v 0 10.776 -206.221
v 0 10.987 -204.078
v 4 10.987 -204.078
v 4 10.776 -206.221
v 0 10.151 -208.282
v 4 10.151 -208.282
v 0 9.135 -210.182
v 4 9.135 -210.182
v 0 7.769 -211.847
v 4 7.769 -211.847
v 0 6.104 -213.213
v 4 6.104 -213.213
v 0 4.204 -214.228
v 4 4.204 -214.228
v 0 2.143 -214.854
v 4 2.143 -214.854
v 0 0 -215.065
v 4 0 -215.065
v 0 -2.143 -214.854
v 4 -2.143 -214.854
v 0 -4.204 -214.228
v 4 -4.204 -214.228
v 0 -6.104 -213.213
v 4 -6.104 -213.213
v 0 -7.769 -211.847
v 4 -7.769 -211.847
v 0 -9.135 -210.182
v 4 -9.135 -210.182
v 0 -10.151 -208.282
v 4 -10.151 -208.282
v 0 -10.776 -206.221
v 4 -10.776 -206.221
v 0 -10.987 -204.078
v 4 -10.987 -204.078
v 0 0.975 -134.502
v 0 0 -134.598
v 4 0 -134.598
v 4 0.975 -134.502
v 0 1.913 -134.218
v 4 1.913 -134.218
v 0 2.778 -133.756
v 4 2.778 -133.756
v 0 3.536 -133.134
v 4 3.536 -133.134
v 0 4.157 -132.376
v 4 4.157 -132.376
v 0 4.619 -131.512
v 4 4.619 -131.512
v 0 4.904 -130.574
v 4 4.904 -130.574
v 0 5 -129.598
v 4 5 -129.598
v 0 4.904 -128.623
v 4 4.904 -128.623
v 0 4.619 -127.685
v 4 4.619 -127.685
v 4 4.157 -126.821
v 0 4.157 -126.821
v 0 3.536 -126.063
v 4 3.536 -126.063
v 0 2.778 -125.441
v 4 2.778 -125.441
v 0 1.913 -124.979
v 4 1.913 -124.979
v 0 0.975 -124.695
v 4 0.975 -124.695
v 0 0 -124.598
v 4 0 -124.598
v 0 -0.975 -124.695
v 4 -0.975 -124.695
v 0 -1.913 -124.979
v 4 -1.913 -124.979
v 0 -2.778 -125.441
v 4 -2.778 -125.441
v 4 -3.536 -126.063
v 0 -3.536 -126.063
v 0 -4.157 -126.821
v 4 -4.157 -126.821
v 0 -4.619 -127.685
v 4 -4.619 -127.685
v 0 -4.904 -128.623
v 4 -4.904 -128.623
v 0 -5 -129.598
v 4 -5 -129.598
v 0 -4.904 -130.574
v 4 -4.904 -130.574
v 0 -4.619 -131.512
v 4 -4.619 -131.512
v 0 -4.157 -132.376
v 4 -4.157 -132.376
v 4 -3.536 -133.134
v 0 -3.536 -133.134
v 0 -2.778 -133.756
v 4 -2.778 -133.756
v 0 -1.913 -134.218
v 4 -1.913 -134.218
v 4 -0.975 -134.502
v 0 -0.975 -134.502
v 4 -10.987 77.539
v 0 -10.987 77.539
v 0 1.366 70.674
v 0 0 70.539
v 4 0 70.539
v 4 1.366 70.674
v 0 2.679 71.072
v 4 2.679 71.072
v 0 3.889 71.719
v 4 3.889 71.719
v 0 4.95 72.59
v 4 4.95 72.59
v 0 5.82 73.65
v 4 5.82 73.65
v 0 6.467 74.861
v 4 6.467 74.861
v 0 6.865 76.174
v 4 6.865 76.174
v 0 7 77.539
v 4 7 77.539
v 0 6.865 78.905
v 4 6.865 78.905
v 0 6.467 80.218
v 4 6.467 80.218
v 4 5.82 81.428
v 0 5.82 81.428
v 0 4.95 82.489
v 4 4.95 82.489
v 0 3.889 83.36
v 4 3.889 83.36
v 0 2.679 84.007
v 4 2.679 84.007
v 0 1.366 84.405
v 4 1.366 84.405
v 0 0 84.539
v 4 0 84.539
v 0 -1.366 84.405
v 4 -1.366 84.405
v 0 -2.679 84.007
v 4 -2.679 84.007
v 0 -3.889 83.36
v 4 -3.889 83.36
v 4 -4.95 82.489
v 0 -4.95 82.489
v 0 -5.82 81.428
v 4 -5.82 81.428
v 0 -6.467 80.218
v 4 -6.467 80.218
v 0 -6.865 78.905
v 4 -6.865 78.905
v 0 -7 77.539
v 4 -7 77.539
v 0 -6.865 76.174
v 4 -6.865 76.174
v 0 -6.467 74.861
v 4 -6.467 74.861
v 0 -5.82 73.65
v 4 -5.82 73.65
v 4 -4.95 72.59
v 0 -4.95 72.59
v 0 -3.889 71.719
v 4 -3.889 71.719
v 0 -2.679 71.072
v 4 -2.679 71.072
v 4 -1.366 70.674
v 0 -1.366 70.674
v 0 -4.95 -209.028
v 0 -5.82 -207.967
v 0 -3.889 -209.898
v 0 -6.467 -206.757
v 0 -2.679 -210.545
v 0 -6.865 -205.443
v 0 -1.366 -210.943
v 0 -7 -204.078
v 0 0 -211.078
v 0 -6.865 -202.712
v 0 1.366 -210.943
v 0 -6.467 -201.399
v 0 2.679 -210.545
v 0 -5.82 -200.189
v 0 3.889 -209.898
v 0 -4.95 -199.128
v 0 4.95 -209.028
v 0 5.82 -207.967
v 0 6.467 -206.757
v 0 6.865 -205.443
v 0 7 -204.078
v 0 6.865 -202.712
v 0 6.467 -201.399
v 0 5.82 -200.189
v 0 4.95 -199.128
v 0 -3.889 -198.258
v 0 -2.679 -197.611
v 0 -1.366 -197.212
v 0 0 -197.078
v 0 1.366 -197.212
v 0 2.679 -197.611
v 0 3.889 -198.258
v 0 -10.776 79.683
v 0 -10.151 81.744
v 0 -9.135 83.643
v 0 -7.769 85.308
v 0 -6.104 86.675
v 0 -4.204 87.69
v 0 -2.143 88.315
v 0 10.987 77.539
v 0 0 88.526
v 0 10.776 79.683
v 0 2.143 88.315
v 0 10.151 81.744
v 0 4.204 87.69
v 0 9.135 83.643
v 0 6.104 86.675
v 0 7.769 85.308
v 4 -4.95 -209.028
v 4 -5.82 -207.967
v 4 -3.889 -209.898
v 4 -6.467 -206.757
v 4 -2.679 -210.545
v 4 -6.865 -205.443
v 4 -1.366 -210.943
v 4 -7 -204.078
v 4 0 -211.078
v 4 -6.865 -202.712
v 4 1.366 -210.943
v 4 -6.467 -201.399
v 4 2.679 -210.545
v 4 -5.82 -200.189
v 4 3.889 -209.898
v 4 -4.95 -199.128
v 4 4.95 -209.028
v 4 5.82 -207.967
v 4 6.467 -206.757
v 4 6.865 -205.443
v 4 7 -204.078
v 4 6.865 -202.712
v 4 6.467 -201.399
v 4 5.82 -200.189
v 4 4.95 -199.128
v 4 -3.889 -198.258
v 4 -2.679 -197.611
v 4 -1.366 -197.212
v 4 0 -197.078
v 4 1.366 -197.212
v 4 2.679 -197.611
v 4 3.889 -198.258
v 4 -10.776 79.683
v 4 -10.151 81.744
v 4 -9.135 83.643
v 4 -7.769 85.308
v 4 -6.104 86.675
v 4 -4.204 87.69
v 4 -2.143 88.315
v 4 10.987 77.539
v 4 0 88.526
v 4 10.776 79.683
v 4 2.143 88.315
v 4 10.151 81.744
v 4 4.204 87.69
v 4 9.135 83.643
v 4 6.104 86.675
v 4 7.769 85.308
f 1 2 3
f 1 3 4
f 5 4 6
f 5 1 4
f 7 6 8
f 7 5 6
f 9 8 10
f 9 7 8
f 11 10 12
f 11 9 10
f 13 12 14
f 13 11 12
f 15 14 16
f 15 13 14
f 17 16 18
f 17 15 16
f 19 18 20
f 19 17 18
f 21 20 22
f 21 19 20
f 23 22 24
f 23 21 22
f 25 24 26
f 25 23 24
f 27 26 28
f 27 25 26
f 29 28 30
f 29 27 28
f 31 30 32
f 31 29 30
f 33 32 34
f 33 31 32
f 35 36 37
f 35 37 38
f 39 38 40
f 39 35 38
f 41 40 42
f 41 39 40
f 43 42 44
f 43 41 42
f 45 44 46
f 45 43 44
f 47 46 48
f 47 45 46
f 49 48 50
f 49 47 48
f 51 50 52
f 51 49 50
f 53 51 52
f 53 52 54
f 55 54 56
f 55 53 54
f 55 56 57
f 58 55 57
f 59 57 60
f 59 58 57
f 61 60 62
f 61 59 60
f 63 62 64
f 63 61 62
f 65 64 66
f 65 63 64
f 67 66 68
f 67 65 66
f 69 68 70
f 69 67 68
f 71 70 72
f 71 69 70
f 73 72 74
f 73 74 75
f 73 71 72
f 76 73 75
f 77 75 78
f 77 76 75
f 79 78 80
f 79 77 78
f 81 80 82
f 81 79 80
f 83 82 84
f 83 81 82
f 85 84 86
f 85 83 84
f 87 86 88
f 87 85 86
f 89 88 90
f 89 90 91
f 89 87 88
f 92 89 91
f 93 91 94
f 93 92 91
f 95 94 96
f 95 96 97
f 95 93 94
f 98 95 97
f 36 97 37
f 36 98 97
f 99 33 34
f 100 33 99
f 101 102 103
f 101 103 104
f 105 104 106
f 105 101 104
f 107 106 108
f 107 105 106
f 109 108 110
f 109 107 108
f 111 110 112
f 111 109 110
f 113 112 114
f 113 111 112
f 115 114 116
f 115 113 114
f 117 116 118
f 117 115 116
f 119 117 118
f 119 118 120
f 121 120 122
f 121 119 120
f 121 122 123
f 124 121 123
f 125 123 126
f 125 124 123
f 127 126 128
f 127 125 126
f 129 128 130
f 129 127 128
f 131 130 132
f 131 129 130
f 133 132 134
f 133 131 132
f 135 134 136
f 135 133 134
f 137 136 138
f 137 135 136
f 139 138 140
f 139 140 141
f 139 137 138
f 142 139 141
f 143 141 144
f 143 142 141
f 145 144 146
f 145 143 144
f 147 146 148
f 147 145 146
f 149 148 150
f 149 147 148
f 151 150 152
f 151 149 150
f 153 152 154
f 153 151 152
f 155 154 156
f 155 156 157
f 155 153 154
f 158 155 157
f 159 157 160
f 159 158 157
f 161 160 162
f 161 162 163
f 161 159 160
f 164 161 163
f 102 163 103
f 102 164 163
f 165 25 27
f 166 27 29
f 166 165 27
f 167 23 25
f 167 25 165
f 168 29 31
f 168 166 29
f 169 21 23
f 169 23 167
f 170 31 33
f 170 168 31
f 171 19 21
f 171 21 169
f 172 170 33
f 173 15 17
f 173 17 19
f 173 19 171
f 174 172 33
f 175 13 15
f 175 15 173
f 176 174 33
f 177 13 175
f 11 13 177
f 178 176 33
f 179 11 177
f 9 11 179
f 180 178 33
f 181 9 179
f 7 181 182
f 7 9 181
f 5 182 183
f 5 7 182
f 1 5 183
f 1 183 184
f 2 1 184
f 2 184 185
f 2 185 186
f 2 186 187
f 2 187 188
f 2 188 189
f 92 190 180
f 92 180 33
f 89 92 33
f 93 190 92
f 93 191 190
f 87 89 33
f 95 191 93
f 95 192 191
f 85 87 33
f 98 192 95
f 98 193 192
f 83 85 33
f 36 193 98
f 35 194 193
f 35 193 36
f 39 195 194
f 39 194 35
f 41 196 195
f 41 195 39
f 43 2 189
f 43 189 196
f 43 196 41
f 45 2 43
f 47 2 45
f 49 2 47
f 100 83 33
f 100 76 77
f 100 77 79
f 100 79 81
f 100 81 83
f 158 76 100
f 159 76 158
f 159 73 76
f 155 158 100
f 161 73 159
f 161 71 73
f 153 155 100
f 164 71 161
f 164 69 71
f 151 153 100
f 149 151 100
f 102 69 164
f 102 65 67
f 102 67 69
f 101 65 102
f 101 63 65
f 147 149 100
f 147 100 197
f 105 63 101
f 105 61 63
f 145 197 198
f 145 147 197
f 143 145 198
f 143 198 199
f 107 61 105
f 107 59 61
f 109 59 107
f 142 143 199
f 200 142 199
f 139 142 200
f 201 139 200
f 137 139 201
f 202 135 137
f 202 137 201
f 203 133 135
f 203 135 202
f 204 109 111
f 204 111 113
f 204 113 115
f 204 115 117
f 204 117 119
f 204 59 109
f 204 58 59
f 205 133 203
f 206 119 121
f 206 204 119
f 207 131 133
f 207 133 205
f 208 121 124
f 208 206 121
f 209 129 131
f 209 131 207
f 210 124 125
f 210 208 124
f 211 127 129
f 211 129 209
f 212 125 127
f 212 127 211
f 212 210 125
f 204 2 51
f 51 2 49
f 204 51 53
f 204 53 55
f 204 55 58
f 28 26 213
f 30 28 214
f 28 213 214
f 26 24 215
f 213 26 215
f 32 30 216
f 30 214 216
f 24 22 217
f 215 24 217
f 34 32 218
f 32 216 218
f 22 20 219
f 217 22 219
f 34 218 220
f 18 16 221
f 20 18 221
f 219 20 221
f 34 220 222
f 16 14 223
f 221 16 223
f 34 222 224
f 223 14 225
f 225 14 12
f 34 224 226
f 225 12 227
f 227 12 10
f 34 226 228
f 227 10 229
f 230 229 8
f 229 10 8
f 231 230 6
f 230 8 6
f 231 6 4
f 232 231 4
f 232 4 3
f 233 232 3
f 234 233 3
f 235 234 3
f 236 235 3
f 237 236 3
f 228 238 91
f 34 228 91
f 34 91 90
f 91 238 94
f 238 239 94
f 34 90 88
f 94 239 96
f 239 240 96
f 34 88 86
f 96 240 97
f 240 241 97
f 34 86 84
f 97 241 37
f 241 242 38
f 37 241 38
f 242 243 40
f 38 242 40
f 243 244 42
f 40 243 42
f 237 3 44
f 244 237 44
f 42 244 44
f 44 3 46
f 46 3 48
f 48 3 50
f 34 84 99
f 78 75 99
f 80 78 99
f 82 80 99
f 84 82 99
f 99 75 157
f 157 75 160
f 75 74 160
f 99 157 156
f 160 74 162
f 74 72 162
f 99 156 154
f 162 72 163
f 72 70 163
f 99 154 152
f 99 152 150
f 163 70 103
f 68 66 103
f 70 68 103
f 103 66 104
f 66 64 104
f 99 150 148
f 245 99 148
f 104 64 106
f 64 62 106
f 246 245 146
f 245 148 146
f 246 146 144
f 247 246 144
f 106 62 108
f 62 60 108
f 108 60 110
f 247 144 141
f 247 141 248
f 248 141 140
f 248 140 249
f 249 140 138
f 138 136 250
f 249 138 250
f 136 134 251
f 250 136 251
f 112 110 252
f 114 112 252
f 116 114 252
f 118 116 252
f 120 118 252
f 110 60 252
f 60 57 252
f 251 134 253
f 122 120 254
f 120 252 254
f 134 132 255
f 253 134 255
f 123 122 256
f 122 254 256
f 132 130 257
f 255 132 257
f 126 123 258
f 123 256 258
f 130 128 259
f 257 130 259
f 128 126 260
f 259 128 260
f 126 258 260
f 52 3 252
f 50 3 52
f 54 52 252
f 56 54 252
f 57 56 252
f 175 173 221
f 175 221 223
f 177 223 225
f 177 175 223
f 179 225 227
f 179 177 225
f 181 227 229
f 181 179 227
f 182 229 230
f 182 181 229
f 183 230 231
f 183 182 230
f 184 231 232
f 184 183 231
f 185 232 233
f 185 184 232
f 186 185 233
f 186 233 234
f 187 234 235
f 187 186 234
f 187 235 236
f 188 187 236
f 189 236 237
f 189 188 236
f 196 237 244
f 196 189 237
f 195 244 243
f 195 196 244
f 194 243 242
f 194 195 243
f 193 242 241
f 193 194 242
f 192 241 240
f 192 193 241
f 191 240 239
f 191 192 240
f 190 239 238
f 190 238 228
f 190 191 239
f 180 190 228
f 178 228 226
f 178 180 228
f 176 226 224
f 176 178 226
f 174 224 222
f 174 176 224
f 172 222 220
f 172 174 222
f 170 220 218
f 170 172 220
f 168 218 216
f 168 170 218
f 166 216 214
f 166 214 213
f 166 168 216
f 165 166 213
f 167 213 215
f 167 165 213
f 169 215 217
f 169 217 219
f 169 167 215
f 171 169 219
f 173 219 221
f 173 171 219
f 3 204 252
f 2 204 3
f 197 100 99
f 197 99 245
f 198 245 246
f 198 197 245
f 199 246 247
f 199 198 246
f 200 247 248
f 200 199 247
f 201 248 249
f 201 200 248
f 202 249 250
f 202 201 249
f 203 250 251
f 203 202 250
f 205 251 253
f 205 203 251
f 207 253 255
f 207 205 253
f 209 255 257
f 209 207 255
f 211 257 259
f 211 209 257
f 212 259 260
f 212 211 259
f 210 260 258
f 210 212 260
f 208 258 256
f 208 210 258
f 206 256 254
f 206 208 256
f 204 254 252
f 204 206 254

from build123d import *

# Parameters (mm, degrees)
SKETCH2_R           = 7
SKETCH2_R_2         = 5
BOSS_EXTRUDE1_DEPTH = 4


with BuildPart() as part:
    # Sketch2 → Boss-Extrude1 (new body)
    with BuildSketch(Plane(origin=(0, 0, 0), x_dir=(0, 0, -1), z_dir=(1, 0, 0))):
        with BuildLine():
            Line((-77.539483891, 10.986864981), (204.077859883, 10.986864981))
            ThreePointArc((204.077859883, 10.986864981), (215.064724865, 0), (204.077859883, -10.986864981))
            Line((204.077859883, -10.986864981), (-77.539483891, -10.986864981))
            ThreePointArc((-77.539483891, -10.986864981), (-88.526348873, 0), (-77.539483891, 10.986864981))
        make_face()
        with Locations((-77.539483891, 0)):
            Circle(SKETCH2_R, mode=Mode.SUBTRACT)
        with Locations((204.077859883, 0)):
            Circle(SKETCH2_R, mode=Mode.SUBTRACT)
        with Locations((129.598441876, 0)):
            Circle(SKETCH2_R_2, mode=Mode.SUBTRACT)
    extrude(amount=BOSS_EXTRUDE1_DEPTH)


solid = part.part
